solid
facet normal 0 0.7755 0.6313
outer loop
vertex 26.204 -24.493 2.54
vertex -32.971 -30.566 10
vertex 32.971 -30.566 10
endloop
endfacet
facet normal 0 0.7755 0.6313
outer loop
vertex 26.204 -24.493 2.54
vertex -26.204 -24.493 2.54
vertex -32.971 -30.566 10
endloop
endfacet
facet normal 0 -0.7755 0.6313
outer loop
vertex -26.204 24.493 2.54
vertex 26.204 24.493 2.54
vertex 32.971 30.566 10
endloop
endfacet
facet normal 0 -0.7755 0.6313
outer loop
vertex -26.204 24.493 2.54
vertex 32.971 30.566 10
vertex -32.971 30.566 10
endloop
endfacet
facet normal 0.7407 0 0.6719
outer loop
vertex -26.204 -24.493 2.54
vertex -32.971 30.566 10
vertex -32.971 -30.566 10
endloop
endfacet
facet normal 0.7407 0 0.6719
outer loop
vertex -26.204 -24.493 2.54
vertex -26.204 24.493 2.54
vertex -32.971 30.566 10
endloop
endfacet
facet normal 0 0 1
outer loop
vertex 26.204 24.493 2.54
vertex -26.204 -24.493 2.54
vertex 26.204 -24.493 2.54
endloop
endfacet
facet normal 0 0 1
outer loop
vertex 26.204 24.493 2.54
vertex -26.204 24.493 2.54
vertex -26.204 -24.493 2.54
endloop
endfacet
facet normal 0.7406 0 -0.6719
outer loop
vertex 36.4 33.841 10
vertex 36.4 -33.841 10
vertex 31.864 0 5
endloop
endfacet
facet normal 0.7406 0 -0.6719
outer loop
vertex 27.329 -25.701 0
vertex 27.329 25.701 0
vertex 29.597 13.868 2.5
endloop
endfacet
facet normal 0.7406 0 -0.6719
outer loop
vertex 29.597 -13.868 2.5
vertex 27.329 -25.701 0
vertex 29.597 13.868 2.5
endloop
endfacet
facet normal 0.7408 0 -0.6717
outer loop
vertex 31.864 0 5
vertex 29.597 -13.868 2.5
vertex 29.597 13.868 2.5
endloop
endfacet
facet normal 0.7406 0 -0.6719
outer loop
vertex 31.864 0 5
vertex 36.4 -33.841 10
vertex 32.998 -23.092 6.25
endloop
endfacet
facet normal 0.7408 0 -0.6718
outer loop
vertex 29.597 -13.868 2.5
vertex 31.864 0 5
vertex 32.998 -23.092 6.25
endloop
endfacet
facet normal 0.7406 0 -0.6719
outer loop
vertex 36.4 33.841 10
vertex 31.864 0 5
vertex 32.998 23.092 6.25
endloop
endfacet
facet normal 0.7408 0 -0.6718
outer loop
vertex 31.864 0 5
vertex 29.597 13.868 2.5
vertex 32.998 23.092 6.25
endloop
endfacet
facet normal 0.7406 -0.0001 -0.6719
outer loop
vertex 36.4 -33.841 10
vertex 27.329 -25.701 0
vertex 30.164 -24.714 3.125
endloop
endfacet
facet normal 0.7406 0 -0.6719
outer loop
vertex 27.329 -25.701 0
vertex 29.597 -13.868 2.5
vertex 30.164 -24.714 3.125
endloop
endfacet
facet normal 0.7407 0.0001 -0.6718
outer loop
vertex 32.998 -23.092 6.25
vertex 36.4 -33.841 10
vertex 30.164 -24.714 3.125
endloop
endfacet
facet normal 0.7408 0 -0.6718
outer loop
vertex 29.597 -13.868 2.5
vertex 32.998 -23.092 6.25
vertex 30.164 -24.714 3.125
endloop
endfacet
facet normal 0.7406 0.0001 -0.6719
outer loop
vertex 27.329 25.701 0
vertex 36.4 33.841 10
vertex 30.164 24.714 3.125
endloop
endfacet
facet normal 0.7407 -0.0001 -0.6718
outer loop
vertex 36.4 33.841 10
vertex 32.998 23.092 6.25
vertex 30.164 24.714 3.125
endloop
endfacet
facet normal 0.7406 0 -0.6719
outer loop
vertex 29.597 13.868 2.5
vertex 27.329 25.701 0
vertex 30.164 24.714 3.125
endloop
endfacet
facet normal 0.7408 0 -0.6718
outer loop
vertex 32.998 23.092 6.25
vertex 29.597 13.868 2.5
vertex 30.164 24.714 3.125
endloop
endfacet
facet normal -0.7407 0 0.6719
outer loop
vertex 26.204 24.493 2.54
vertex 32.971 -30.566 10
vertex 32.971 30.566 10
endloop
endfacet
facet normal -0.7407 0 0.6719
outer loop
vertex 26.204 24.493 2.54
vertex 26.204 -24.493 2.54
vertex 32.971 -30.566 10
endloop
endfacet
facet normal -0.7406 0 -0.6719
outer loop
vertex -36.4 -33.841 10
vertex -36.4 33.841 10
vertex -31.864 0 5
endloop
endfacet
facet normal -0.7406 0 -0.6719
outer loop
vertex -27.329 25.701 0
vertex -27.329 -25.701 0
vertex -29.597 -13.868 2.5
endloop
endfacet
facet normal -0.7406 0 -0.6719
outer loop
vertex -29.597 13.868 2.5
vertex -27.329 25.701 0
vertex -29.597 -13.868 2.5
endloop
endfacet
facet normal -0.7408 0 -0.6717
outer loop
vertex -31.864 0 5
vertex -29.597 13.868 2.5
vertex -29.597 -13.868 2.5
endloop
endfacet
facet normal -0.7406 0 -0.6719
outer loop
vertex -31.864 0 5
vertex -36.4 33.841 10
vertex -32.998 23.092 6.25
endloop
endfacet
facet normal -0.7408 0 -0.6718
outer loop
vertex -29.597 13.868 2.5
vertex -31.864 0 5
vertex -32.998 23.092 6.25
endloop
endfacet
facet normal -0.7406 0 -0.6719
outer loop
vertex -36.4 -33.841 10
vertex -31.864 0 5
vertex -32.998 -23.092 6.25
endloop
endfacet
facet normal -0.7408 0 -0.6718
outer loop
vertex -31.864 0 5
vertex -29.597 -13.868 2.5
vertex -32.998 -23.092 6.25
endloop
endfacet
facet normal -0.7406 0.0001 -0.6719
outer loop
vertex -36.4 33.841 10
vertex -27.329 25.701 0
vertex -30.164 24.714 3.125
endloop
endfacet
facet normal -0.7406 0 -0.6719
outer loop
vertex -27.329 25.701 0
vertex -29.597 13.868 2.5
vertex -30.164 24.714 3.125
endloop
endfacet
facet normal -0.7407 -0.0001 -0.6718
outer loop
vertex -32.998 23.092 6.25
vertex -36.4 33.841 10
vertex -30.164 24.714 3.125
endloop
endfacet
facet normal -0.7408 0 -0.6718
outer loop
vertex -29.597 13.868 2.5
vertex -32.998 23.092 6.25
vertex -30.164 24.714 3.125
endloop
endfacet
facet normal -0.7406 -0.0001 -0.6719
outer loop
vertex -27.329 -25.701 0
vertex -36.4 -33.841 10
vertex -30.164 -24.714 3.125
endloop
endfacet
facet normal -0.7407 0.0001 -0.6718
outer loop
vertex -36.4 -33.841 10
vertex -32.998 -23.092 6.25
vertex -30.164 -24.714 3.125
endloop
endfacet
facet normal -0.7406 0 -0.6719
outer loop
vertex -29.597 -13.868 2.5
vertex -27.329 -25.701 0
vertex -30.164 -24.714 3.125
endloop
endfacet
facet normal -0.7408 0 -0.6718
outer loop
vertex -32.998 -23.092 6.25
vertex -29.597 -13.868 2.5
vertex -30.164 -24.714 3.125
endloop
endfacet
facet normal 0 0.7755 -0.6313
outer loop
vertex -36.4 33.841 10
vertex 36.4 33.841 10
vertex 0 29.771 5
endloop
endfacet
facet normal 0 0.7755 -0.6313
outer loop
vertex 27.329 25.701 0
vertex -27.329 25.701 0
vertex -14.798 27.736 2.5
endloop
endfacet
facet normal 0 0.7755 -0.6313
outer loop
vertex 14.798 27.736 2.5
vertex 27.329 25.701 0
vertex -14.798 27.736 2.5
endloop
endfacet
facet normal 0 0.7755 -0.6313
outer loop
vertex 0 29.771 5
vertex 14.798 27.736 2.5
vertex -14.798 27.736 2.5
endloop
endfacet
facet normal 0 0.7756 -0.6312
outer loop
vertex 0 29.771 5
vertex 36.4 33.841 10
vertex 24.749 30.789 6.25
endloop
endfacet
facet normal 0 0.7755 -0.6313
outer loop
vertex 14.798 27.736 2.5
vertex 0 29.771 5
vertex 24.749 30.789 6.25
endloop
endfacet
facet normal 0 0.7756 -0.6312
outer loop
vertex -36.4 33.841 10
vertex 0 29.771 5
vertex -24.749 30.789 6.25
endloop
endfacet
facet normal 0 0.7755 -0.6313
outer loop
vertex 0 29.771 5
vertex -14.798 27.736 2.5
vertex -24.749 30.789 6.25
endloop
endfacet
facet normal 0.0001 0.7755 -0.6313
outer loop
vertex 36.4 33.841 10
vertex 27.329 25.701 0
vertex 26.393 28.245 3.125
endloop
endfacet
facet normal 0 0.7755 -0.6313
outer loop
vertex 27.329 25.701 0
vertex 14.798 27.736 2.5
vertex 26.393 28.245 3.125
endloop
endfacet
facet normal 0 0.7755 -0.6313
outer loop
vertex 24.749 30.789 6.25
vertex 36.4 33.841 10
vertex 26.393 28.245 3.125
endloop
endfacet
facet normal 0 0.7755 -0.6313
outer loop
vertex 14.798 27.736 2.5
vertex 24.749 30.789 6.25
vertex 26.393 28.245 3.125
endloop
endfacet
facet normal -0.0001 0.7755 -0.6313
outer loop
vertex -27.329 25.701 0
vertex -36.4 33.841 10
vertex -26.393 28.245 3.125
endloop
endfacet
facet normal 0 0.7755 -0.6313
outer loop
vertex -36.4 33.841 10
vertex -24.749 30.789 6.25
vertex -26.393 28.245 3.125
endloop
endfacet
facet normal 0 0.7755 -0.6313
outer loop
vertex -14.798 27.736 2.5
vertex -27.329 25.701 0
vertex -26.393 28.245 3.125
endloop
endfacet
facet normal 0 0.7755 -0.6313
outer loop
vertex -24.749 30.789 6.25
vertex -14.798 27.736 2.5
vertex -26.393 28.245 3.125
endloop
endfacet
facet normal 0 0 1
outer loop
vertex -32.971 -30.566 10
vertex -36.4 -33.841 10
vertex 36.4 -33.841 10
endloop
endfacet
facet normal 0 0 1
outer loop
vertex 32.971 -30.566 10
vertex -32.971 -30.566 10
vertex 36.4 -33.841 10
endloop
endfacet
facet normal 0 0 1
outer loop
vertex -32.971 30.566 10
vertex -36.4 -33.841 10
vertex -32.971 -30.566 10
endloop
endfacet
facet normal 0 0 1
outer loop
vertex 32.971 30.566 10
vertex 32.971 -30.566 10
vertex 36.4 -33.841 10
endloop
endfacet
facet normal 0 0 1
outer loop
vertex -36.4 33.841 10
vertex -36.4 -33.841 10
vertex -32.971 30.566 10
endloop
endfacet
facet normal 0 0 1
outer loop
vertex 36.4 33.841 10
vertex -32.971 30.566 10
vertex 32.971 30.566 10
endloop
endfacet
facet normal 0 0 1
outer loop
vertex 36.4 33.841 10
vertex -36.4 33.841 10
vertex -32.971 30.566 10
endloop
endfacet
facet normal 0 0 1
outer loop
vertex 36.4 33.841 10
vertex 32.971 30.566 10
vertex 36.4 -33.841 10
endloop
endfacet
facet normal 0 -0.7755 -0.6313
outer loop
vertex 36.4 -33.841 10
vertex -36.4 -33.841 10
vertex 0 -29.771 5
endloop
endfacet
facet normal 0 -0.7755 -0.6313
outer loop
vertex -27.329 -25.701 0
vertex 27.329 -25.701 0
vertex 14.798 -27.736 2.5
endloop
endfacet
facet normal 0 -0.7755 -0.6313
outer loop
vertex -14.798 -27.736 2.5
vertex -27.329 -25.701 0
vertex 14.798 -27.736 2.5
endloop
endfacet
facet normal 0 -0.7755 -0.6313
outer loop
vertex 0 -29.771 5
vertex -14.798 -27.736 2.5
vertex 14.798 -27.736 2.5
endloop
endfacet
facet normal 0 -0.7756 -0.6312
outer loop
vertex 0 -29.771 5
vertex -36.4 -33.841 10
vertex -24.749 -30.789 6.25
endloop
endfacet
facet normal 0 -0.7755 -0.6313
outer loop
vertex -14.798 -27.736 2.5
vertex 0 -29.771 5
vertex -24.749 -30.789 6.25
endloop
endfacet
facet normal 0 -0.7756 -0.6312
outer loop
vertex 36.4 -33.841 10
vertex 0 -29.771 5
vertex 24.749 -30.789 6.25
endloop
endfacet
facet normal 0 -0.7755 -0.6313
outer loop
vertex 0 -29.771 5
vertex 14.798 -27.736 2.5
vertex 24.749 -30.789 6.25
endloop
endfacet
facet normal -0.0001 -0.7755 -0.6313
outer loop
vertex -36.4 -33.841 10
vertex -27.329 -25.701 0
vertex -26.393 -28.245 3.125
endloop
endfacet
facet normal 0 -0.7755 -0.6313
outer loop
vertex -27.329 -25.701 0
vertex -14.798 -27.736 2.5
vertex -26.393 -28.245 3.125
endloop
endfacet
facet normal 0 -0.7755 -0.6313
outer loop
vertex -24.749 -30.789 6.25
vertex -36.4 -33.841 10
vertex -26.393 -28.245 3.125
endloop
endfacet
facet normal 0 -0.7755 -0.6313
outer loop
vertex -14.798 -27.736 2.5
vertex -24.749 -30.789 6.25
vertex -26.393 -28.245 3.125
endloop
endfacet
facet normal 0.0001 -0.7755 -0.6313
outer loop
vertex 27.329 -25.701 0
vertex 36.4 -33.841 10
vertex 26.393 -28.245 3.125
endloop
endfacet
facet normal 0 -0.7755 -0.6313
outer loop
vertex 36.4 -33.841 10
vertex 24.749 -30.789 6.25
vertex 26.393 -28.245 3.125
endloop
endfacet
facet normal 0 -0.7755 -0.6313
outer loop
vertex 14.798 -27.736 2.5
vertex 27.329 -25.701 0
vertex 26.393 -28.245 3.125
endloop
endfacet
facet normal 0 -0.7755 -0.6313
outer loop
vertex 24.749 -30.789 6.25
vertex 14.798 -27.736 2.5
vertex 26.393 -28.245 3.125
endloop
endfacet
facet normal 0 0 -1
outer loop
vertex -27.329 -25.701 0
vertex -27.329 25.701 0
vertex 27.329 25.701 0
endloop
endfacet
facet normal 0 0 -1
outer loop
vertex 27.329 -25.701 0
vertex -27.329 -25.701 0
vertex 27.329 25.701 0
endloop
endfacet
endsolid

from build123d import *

# Parameters (mm, degrees)
F0_W      = 54.6579919755
F0_H      = 51.4017753303
F1_DEPTH  = 2
F3_W      = 72.7997943759
F3_H      = 67.682877183
F1_FACE_W = 54.6579919755
F1_FACE_H = 51.4017753303
F5_T      = -2.54


# Not quite as in the source:
# - the program builds the solid bodies; features that only make, move or delete a surface that nothing else refers to are left out


with BuildPart() as f1:
    # F0 (on Top) → F1 (new body)
    with BuildSketch(Plane.XY):
        Rectangle(F0_W, F0_H)
    extrude(amount=F1_DEPTH)

    # F3 (on offset) → F4 section 0
    with BuildSketch(Plane.XY.offset(10)):
        Rectangle(F3_W, F3_H)
    # F1_face (on face) → F4 section 1
    with BuildSketch(Plane(origin=(0, 0, 0), x_dir=(1, 0, 0), z_dir=(0, 0, -1))):
        Rectangle(F1_FACE_W, F1_FACE_H)
    loft()

    # F5
    f5_openings = [f1.faces().sort_by_distance(p)[0] for p in [
        (0, 0, 10),
    ]]
    offset(amount=F5_T, openings=f5_openings)


solid = f1.part
